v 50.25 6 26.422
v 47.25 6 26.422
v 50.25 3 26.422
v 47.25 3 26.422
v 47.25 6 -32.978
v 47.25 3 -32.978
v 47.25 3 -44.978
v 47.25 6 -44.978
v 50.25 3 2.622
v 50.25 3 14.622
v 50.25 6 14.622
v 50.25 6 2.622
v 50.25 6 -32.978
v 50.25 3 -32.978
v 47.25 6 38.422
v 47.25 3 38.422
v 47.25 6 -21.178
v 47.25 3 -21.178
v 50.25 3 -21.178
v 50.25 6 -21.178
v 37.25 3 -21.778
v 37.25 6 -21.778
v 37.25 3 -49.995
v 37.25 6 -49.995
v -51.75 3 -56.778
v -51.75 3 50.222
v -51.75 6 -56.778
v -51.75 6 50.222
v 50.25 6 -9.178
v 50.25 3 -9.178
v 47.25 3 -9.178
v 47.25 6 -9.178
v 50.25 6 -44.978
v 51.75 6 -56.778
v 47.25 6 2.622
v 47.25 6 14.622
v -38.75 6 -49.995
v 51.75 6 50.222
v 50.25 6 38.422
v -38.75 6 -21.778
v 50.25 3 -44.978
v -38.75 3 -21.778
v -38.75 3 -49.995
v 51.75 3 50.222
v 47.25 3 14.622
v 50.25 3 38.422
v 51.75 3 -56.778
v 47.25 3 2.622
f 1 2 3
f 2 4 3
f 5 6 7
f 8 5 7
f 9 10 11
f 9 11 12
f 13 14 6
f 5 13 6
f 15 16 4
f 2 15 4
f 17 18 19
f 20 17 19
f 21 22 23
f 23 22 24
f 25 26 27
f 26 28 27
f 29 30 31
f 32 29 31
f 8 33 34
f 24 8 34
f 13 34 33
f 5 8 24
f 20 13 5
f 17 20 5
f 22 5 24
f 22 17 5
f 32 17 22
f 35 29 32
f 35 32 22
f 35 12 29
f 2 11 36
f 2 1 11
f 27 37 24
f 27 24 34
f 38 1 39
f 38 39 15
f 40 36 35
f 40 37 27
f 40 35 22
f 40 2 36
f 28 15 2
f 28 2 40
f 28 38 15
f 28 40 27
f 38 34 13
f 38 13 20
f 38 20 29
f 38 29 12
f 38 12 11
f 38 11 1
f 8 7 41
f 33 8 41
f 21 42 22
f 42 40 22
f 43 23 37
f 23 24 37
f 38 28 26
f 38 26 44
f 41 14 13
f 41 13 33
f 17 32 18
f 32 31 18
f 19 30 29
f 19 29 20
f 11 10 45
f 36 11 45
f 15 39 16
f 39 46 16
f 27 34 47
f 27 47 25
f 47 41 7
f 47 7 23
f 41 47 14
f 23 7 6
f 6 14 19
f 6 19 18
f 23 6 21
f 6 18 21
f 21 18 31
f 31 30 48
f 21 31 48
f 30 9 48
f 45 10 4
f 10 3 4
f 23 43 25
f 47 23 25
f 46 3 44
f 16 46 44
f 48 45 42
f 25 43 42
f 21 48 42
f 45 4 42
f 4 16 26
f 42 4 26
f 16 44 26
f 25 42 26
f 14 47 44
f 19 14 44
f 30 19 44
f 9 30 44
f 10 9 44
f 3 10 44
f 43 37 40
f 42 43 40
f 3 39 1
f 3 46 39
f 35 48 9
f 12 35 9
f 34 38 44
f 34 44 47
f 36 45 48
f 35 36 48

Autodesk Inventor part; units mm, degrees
ref_plane "YZ Plane" through (0, 0, 0) normal (1, 0, 0) x (0, 1, 0)
ref_plane "XZ Plane" through (0, 0, 0) normal (0, 1, 0) x (-1, 0, 0)
ref_plane "Plano de trabalho1" through (-46, 6, -51.528) normal (0, -1, 0) x (1, 0, 0)
sketch "Esboço5" plane through (0, 0, 0) normal (0, 1, 0) x (-1, 0, 0)
  line L0 (51.75, 50.222) -> (51.75, -56.778)
  line L1 (38.75, -49.9946) -> (38.75, -21.778)
  line L2 (51.75, -21.778) -> (51.75, -56.778)
  line L3 (38.75, -21.778) -> (-37.25, -21.778)
  line L4 (-37.25, -21.778) -> (-37.25, -49.9946)
  line L5 (-37.25, -49.9946) -> (38.75, -49.9946)
  line L6 (51.75, 50.222) -> (-51.75, 50.222)
  line L7 (-51.75, 50.222) -> (-51.75, -56.778)
  line L8 (-51.75, -56.778) -> (51.75, -56.778)
  point P0 (0, 0)
  dimension "d24" = 76
  dimension "d28" = 51.75
  dimension "d30" = 103.5
extrude "Extrusão4" add sketch "Esboço5" against normal blind 3 from surface at 6
sketch "Esboço6" plane through (-51.75, 3, 50.222) normal (0, -1, 0) x (1, 0, 0)
  point P0 (51.75, -50.222)
sketch "Esboço7" plane through (-51.75, 3, 50.222) normal (0, -1, 0) x (1, 0, 0)
  line L0 (99, -95.2) -> (102, -95.2) projected
  line L1 (102, -83.2) -> (102, -95.2) projected
  line L2 (102, -83.2) -> (99, -83.2) projected
  line L3 (99, -83.2) -> (99, -95.2) projected
  line L4 (99, -71.4) -> (102, -71.4) projected
  line L5 (102, -59.4) -> (102, -71.4) projected
  line L6 (102, -59.4) -> (99, -59.4) projected
  line L7 (99, -59.4) -> (99, -71.4) projected
  line L8 (102, -35.6) -> (99, -35.6) projected
  line L9 (99, -35.6) -> (99, -47.6) projected
  line L10 (99, -47.6) -> (102, -47.6) projected
  line L11 (102, -35.6) -> (102, -47.6) projected
  line L12 (102, -11.8) -> (99, -11.8) projected
  line L13 (99, -11.8) -> (99, -23.8) projected
  line L14 (99, -23.8) -> (102, -23.8) projected
  line L15 (102, -11.8) -> (102, -23.8) projected
  line L16 (102, -95.2) -> (99, -95.2)
  line L17 (99, -95.2) -> (99, -83.2)
  line L18 (99, -83.2) -> (102, -83.2)
  line L19 (102, -83.2) -> (102, -95.2)
  line L20 (102, -71.4) -> (99, -71.4)
  line L21 (99, -71.4) -> (99, -59.4)
  line L22 (99, -59.4) -> (102, -59.4)
  line L23 (102, -59.4) -> (102, -71.4)
  line L24 (102, -47.6) -> (99, -47.6)
  line L25 (99, -47.6) -> (99, -35.6)
  line L26 (99, -35.6) -> (102, -35.6)
  line L27 (102, -35.6) -> (102, -47.6)
  line L28 (102, -23.8) -> (99, -23.8)
  line L29 (99, -23.8) -> (99, -11.8)
  line L30 (99, -11.8) -> (102, -11.8)
  line L31 (102, -11.8) -> (102, -23.8)
  point P0 (51.75, -50.222)
extrude "Extrusão5" cut sketch "Esboço7" against normal blind 3
equation "\"d30\" = 2 * d28"
properties part number "Chassi_inf"
